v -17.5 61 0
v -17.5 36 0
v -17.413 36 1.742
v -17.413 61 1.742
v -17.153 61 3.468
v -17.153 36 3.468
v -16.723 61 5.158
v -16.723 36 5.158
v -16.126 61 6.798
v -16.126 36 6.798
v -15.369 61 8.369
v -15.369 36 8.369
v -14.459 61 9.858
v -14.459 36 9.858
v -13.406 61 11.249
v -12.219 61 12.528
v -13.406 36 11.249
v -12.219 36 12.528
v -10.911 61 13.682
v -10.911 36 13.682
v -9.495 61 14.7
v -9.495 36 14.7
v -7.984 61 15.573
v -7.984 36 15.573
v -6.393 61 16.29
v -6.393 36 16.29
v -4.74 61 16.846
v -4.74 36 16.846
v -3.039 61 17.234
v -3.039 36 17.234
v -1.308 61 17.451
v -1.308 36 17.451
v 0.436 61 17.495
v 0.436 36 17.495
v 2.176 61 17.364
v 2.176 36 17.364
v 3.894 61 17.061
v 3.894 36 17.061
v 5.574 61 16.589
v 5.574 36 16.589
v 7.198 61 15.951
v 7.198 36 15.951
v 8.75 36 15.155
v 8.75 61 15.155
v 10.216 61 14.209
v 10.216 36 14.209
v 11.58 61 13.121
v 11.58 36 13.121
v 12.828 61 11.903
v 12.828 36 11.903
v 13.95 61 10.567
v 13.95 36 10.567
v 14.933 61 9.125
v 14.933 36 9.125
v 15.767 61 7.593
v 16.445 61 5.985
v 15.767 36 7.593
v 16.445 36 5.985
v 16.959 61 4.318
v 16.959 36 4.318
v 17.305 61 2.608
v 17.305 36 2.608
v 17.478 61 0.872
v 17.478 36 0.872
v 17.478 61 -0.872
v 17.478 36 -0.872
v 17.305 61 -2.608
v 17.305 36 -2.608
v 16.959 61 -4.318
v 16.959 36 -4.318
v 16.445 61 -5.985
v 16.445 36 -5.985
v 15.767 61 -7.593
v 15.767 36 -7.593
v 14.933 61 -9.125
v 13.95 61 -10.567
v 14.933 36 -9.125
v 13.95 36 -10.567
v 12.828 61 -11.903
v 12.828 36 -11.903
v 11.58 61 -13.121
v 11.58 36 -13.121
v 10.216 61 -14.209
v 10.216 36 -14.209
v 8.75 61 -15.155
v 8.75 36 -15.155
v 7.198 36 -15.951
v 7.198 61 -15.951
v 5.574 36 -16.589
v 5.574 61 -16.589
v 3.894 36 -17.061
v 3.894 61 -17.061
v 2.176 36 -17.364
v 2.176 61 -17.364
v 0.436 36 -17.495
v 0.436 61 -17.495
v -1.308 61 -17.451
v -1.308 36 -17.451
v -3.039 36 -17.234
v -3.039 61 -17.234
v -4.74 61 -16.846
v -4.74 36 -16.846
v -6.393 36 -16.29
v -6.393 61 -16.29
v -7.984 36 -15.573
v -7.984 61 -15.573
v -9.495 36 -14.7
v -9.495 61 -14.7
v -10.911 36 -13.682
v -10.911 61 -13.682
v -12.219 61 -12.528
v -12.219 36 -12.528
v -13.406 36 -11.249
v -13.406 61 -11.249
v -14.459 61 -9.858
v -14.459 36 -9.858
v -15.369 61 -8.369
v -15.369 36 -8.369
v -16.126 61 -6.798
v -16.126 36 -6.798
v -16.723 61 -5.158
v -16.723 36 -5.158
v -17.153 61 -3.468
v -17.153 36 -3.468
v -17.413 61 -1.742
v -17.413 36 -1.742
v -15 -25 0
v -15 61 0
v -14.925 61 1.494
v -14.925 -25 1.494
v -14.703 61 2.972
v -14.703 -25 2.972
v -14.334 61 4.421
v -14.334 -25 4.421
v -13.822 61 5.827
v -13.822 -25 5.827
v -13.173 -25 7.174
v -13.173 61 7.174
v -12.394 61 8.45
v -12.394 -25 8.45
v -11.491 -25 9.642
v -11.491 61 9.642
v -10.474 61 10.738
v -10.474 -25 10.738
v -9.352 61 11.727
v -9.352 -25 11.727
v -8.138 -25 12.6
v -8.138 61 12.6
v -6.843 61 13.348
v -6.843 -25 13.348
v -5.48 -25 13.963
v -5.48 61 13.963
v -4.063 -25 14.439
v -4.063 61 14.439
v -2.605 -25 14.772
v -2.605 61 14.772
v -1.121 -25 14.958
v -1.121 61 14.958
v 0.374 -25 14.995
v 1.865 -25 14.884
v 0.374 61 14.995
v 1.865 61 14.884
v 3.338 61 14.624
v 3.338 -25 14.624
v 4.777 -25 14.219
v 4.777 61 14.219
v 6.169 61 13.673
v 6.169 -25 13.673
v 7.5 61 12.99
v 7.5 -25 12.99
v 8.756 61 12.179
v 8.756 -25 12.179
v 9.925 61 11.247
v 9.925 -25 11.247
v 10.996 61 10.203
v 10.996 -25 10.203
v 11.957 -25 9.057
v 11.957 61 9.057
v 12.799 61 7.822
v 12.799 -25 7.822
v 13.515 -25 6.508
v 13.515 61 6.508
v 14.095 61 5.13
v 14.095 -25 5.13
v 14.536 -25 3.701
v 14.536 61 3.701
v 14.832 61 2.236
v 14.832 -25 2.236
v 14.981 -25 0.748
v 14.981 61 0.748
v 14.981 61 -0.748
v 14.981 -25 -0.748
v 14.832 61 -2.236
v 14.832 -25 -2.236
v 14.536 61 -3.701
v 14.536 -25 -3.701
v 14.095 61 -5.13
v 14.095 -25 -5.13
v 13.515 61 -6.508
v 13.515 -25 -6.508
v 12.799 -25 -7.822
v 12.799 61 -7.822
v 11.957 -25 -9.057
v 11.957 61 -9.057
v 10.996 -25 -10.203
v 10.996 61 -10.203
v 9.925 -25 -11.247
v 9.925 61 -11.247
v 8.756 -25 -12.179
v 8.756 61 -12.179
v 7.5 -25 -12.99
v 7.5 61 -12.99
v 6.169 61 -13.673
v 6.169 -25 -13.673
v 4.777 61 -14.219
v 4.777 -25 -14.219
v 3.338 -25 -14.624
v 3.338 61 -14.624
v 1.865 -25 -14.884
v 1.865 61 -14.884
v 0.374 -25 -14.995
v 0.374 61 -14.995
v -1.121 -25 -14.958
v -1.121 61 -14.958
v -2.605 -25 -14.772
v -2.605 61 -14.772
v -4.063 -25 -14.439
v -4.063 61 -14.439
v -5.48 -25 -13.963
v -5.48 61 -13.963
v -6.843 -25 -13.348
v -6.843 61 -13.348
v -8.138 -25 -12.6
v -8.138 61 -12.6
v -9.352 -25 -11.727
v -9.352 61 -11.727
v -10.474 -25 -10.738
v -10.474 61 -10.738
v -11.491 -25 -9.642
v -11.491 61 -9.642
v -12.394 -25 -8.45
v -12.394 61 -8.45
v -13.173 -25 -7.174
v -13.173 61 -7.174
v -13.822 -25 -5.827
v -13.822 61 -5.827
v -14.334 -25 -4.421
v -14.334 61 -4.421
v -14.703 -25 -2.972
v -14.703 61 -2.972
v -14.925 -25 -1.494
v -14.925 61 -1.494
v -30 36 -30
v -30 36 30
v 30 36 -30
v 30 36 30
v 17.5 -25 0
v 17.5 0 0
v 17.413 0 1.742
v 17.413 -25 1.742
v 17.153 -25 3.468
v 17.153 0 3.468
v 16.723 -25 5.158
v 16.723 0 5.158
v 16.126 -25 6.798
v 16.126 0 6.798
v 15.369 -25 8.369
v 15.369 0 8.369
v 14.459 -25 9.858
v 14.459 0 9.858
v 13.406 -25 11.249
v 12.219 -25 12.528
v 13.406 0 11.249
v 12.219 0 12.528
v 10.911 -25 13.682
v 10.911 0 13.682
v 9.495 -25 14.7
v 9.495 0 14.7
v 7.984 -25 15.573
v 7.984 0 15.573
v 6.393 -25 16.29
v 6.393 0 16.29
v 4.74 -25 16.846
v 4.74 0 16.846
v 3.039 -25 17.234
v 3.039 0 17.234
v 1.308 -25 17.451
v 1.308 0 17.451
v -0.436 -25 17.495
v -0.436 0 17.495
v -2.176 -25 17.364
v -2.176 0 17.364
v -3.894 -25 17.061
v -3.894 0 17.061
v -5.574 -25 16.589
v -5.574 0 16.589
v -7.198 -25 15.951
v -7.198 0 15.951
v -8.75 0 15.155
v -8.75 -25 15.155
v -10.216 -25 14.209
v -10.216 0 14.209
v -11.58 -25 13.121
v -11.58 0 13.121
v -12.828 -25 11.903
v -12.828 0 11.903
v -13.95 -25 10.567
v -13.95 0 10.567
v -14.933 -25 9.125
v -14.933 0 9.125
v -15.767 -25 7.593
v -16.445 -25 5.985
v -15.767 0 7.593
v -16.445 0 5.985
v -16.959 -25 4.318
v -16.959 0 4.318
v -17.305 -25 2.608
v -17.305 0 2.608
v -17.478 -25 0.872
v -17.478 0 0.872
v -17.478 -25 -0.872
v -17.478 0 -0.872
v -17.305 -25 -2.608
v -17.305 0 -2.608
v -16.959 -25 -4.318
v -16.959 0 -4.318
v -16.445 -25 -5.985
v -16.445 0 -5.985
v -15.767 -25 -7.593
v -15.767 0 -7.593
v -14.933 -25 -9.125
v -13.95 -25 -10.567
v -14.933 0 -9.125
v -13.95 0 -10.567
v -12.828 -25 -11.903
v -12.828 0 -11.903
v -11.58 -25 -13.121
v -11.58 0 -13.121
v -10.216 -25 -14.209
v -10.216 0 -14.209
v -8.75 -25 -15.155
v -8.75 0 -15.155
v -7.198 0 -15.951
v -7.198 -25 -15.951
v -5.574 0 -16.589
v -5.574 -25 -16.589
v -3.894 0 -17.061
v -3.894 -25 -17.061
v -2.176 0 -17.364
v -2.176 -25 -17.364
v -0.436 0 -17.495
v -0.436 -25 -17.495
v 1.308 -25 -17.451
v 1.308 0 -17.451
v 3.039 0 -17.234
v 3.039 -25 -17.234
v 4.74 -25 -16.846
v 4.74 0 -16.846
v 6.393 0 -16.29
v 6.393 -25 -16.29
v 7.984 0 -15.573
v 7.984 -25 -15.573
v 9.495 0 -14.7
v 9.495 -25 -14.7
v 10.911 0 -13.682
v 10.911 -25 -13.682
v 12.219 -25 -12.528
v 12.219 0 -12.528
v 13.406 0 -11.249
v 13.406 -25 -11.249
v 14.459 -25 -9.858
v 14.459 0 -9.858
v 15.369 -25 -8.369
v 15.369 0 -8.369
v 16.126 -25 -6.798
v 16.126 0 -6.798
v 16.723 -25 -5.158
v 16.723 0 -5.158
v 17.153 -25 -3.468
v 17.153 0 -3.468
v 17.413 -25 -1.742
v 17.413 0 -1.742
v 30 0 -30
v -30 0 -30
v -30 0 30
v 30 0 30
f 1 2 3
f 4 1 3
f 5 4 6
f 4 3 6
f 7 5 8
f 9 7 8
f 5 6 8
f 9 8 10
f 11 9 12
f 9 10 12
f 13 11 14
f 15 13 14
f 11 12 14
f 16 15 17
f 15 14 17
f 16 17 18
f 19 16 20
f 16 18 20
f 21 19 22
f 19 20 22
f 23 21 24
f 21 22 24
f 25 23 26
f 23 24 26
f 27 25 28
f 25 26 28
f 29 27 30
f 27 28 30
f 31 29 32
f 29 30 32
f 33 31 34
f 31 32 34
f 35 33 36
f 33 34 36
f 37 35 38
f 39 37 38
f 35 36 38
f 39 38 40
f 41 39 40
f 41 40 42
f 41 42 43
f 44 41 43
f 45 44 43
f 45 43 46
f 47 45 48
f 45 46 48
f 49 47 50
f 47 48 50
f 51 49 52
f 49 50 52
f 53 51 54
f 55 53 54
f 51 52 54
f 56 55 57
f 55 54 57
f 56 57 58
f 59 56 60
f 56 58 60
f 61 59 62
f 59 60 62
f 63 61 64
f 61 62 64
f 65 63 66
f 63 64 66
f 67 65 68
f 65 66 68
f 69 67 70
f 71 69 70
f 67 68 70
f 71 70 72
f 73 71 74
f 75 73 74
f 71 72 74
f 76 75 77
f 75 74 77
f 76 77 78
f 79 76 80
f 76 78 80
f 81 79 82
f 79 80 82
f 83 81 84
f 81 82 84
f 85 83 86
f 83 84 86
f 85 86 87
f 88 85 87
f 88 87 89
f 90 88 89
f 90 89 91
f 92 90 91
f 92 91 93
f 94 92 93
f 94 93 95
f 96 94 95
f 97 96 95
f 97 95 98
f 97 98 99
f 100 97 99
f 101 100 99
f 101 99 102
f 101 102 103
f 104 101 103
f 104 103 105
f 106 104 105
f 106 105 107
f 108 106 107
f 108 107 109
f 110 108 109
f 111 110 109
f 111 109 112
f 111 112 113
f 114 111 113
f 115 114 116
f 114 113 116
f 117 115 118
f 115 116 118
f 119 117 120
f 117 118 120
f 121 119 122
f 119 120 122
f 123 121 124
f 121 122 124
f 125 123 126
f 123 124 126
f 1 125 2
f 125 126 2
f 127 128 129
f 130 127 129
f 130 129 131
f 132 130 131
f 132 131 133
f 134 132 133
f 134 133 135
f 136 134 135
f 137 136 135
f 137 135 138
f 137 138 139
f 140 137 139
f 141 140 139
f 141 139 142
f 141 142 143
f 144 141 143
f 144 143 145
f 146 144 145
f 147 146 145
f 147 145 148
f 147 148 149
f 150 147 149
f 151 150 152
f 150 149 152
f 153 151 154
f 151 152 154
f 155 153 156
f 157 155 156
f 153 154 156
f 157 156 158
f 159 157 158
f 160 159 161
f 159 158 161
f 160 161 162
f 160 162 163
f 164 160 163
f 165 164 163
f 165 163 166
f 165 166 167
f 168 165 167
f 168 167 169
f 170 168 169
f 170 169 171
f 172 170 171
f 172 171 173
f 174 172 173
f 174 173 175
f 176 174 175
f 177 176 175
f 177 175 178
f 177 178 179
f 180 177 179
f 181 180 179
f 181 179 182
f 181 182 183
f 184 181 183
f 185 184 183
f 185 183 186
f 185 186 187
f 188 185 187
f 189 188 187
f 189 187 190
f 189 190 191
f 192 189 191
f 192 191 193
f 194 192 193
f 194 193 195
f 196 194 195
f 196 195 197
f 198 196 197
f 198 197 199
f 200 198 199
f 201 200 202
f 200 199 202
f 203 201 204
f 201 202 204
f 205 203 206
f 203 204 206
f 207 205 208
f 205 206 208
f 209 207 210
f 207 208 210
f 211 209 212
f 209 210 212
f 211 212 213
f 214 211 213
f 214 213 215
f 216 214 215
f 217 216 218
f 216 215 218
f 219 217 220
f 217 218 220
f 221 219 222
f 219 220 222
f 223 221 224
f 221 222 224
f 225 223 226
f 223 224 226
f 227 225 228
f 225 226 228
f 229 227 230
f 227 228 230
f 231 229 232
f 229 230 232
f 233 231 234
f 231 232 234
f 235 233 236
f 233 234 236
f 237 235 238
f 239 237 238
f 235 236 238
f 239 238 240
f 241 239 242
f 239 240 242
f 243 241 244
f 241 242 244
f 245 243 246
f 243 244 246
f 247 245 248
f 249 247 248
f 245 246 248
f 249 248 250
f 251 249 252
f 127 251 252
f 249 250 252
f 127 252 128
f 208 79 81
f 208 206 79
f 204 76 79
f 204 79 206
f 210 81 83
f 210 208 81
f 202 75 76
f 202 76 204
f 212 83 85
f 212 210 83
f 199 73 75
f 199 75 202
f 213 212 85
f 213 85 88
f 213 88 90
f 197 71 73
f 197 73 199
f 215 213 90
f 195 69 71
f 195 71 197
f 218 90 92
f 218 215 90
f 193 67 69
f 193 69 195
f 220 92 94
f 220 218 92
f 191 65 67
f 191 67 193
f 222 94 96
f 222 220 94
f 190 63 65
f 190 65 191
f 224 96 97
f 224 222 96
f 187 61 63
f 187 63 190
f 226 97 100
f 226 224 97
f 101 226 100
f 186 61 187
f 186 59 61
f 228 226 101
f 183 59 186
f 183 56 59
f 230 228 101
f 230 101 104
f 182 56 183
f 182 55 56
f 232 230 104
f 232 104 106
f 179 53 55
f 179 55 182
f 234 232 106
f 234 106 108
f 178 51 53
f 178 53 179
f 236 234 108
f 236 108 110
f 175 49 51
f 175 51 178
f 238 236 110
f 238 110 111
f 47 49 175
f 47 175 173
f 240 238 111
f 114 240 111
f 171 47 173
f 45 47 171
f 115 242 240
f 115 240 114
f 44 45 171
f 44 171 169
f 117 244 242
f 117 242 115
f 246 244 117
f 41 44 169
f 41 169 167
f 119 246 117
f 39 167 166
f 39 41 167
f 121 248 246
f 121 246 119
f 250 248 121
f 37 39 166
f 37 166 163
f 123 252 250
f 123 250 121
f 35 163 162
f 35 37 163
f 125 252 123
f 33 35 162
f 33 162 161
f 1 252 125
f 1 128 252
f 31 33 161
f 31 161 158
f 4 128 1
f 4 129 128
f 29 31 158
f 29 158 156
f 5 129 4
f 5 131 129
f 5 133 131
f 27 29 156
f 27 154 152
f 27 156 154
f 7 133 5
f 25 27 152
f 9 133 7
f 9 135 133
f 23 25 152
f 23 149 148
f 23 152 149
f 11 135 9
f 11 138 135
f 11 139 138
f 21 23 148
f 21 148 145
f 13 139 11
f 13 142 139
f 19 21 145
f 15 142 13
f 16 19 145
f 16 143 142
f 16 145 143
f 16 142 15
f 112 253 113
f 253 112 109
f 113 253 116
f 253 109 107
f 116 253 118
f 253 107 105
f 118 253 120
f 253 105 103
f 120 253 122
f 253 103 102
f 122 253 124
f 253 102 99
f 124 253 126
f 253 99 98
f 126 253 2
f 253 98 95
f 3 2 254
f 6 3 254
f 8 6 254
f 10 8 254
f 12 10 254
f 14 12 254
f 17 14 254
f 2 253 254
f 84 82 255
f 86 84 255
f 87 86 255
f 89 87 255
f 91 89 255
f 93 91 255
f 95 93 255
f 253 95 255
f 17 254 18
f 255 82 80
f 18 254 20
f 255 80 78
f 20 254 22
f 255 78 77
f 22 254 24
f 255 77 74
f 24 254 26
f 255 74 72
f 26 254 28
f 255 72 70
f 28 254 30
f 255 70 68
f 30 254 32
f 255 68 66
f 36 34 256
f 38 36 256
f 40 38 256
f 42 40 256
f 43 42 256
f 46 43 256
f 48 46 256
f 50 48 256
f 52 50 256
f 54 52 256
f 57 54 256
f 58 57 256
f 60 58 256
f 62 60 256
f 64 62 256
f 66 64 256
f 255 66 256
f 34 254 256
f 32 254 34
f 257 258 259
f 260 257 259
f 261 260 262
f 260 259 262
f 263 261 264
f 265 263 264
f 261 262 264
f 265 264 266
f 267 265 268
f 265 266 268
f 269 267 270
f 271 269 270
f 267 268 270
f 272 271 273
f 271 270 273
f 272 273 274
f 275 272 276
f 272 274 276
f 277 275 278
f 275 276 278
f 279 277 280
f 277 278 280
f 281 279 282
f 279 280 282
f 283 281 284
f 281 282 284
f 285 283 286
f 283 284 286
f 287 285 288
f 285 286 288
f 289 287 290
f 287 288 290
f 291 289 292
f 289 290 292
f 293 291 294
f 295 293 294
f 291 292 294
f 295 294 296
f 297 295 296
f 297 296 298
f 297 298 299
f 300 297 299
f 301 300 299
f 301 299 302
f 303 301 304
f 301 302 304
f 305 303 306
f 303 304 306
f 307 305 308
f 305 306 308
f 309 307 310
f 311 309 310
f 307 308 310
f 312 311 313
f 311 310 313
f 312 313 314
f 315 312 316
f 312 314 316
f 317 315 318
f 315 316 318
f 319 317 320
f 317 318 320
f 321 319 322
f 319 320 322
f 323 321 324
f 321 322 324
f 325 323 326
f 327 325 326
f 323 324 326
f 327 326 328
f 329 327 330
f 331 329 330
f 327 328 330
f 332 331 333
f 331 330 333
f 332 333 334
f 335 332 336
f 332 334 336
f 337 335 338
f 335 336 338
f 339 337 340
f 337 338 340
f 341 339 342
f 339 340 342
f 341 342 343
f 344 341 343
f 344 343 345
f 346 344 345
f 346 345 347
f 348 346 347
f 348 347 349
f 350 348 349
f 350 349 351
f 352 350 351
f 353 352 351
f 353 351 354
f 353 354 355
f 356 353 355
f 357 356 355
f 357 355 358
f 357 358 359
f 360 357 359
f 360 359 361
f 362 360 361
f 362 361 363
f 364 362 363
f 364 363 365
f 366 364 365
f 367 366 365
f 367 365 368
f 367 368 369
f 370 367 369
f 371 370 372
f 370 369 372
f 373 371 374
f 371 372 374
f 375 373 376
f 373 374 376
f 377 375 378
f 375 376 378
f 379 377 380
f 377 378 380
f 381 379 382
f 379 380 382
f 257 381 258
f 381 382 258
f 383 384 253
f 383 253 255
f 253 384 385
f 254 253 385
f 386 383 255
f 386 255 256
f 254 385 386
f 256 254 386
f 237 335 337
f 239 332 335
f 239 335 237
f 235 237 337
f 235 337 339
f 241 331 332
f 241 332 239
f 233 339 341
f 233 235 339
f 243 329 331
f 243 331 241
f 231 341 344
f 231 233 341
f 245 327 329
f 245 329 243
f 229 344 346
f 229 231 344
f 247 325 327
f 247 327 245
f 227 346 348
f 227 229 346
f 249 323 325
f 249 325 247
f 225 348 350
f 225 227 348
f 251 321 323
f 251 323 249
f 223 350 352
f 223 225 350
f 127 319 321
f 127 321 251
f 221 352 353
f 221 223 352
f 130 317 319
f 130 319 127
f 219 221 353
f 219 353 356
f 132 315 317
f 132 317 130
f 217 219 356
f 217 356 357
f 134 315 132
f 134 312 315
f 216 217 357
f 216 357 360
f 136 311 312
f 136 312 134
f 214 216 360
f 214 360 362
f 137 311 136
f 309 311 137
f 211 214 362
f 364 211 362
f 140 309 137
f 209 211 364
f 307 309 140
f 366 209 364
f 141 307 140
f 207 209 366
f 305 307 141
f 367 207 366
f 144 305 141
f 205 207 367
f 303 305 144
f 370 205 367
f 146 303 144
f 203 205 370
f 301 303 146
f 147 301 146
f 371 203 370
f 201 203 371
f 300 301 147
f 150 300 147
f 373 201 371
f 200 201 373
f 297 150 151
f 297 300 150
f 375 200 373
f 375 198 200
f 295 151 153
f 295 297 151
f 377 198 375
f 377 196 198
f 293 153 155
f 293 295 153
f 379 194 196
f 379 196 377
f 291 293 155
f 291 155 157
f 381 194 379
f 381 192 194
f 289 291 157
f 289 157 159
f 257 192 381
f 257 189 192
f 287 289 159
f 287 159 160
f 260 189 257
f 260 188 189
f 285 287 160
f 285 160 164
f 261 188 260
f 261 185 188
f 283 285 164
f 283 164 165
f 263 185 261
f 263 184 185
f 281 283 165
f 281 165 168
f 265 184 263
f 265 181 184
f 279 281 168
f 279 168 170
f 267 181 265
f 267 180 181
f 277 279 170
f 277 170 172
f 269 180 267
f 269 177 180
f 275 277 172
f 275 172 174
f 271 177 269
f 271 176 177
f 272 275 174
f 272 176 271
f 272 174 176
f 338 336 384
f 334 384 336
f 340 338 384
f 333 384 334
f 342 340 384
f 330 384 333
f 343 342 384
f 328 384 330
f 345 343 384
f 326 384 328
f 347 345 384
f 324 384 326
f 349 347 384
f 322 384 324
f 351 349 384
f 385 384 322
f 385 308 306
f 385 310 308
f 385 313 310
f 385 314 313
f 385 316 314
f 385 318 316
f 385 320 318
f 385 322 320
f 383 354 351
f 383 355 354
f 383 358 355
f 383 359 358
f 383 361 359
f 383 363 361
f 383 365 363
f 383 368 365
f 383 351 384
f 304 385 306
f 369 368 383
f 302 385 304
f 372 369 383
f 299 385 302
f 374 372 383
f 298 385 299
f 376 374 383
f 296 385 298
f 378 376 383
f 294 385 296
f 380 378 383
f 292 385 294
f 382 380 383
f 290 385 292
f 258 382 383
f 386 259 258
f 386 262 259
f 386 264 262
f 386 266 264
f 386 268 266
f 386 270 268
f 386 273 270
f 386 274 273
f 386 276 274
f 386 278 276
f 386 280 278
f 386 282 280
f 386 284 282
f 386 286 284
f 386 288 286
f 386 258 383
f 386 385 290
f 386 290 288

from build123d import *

# Parameters (mm, degrees)
F0_W     = 60
F0_H     = 60
F1_DEPTH = 36
F2_R     = 17.5
F3_DEPTH = 25
F4_R     = 17.5
F5_DEPTH = 25
F7_D     = 30


with BuildPart() as f1:
    # F0 (on Front) → F1 (new body)
    with BuildSketch(Plane.XZ):
        Rectangle(F0_W, F0_H)
    extrude(amount=-F1_DEPTH)

    # F2 (on face) → F3 (join)
    with BuildSketch(Plane.XZ):
        Circle(F2_R)
    extrude(amount=F3_DEPTH)

    # F4 (on face) → F5 (join)
    with BuildSketch(Plane(origin=(0, 36, 0), x_dir=(-1, 0, 0), z_dir=(0, 1, 0))):
        Circle(F4_R)
    extrude(amount=F5_DEPTH)

    # F7 (through all)
    with Locations(Plane.XZ.offset(25)):
        with Locations((0, 0)):
            Hole(F7_D / 2)


solid = f1.part
